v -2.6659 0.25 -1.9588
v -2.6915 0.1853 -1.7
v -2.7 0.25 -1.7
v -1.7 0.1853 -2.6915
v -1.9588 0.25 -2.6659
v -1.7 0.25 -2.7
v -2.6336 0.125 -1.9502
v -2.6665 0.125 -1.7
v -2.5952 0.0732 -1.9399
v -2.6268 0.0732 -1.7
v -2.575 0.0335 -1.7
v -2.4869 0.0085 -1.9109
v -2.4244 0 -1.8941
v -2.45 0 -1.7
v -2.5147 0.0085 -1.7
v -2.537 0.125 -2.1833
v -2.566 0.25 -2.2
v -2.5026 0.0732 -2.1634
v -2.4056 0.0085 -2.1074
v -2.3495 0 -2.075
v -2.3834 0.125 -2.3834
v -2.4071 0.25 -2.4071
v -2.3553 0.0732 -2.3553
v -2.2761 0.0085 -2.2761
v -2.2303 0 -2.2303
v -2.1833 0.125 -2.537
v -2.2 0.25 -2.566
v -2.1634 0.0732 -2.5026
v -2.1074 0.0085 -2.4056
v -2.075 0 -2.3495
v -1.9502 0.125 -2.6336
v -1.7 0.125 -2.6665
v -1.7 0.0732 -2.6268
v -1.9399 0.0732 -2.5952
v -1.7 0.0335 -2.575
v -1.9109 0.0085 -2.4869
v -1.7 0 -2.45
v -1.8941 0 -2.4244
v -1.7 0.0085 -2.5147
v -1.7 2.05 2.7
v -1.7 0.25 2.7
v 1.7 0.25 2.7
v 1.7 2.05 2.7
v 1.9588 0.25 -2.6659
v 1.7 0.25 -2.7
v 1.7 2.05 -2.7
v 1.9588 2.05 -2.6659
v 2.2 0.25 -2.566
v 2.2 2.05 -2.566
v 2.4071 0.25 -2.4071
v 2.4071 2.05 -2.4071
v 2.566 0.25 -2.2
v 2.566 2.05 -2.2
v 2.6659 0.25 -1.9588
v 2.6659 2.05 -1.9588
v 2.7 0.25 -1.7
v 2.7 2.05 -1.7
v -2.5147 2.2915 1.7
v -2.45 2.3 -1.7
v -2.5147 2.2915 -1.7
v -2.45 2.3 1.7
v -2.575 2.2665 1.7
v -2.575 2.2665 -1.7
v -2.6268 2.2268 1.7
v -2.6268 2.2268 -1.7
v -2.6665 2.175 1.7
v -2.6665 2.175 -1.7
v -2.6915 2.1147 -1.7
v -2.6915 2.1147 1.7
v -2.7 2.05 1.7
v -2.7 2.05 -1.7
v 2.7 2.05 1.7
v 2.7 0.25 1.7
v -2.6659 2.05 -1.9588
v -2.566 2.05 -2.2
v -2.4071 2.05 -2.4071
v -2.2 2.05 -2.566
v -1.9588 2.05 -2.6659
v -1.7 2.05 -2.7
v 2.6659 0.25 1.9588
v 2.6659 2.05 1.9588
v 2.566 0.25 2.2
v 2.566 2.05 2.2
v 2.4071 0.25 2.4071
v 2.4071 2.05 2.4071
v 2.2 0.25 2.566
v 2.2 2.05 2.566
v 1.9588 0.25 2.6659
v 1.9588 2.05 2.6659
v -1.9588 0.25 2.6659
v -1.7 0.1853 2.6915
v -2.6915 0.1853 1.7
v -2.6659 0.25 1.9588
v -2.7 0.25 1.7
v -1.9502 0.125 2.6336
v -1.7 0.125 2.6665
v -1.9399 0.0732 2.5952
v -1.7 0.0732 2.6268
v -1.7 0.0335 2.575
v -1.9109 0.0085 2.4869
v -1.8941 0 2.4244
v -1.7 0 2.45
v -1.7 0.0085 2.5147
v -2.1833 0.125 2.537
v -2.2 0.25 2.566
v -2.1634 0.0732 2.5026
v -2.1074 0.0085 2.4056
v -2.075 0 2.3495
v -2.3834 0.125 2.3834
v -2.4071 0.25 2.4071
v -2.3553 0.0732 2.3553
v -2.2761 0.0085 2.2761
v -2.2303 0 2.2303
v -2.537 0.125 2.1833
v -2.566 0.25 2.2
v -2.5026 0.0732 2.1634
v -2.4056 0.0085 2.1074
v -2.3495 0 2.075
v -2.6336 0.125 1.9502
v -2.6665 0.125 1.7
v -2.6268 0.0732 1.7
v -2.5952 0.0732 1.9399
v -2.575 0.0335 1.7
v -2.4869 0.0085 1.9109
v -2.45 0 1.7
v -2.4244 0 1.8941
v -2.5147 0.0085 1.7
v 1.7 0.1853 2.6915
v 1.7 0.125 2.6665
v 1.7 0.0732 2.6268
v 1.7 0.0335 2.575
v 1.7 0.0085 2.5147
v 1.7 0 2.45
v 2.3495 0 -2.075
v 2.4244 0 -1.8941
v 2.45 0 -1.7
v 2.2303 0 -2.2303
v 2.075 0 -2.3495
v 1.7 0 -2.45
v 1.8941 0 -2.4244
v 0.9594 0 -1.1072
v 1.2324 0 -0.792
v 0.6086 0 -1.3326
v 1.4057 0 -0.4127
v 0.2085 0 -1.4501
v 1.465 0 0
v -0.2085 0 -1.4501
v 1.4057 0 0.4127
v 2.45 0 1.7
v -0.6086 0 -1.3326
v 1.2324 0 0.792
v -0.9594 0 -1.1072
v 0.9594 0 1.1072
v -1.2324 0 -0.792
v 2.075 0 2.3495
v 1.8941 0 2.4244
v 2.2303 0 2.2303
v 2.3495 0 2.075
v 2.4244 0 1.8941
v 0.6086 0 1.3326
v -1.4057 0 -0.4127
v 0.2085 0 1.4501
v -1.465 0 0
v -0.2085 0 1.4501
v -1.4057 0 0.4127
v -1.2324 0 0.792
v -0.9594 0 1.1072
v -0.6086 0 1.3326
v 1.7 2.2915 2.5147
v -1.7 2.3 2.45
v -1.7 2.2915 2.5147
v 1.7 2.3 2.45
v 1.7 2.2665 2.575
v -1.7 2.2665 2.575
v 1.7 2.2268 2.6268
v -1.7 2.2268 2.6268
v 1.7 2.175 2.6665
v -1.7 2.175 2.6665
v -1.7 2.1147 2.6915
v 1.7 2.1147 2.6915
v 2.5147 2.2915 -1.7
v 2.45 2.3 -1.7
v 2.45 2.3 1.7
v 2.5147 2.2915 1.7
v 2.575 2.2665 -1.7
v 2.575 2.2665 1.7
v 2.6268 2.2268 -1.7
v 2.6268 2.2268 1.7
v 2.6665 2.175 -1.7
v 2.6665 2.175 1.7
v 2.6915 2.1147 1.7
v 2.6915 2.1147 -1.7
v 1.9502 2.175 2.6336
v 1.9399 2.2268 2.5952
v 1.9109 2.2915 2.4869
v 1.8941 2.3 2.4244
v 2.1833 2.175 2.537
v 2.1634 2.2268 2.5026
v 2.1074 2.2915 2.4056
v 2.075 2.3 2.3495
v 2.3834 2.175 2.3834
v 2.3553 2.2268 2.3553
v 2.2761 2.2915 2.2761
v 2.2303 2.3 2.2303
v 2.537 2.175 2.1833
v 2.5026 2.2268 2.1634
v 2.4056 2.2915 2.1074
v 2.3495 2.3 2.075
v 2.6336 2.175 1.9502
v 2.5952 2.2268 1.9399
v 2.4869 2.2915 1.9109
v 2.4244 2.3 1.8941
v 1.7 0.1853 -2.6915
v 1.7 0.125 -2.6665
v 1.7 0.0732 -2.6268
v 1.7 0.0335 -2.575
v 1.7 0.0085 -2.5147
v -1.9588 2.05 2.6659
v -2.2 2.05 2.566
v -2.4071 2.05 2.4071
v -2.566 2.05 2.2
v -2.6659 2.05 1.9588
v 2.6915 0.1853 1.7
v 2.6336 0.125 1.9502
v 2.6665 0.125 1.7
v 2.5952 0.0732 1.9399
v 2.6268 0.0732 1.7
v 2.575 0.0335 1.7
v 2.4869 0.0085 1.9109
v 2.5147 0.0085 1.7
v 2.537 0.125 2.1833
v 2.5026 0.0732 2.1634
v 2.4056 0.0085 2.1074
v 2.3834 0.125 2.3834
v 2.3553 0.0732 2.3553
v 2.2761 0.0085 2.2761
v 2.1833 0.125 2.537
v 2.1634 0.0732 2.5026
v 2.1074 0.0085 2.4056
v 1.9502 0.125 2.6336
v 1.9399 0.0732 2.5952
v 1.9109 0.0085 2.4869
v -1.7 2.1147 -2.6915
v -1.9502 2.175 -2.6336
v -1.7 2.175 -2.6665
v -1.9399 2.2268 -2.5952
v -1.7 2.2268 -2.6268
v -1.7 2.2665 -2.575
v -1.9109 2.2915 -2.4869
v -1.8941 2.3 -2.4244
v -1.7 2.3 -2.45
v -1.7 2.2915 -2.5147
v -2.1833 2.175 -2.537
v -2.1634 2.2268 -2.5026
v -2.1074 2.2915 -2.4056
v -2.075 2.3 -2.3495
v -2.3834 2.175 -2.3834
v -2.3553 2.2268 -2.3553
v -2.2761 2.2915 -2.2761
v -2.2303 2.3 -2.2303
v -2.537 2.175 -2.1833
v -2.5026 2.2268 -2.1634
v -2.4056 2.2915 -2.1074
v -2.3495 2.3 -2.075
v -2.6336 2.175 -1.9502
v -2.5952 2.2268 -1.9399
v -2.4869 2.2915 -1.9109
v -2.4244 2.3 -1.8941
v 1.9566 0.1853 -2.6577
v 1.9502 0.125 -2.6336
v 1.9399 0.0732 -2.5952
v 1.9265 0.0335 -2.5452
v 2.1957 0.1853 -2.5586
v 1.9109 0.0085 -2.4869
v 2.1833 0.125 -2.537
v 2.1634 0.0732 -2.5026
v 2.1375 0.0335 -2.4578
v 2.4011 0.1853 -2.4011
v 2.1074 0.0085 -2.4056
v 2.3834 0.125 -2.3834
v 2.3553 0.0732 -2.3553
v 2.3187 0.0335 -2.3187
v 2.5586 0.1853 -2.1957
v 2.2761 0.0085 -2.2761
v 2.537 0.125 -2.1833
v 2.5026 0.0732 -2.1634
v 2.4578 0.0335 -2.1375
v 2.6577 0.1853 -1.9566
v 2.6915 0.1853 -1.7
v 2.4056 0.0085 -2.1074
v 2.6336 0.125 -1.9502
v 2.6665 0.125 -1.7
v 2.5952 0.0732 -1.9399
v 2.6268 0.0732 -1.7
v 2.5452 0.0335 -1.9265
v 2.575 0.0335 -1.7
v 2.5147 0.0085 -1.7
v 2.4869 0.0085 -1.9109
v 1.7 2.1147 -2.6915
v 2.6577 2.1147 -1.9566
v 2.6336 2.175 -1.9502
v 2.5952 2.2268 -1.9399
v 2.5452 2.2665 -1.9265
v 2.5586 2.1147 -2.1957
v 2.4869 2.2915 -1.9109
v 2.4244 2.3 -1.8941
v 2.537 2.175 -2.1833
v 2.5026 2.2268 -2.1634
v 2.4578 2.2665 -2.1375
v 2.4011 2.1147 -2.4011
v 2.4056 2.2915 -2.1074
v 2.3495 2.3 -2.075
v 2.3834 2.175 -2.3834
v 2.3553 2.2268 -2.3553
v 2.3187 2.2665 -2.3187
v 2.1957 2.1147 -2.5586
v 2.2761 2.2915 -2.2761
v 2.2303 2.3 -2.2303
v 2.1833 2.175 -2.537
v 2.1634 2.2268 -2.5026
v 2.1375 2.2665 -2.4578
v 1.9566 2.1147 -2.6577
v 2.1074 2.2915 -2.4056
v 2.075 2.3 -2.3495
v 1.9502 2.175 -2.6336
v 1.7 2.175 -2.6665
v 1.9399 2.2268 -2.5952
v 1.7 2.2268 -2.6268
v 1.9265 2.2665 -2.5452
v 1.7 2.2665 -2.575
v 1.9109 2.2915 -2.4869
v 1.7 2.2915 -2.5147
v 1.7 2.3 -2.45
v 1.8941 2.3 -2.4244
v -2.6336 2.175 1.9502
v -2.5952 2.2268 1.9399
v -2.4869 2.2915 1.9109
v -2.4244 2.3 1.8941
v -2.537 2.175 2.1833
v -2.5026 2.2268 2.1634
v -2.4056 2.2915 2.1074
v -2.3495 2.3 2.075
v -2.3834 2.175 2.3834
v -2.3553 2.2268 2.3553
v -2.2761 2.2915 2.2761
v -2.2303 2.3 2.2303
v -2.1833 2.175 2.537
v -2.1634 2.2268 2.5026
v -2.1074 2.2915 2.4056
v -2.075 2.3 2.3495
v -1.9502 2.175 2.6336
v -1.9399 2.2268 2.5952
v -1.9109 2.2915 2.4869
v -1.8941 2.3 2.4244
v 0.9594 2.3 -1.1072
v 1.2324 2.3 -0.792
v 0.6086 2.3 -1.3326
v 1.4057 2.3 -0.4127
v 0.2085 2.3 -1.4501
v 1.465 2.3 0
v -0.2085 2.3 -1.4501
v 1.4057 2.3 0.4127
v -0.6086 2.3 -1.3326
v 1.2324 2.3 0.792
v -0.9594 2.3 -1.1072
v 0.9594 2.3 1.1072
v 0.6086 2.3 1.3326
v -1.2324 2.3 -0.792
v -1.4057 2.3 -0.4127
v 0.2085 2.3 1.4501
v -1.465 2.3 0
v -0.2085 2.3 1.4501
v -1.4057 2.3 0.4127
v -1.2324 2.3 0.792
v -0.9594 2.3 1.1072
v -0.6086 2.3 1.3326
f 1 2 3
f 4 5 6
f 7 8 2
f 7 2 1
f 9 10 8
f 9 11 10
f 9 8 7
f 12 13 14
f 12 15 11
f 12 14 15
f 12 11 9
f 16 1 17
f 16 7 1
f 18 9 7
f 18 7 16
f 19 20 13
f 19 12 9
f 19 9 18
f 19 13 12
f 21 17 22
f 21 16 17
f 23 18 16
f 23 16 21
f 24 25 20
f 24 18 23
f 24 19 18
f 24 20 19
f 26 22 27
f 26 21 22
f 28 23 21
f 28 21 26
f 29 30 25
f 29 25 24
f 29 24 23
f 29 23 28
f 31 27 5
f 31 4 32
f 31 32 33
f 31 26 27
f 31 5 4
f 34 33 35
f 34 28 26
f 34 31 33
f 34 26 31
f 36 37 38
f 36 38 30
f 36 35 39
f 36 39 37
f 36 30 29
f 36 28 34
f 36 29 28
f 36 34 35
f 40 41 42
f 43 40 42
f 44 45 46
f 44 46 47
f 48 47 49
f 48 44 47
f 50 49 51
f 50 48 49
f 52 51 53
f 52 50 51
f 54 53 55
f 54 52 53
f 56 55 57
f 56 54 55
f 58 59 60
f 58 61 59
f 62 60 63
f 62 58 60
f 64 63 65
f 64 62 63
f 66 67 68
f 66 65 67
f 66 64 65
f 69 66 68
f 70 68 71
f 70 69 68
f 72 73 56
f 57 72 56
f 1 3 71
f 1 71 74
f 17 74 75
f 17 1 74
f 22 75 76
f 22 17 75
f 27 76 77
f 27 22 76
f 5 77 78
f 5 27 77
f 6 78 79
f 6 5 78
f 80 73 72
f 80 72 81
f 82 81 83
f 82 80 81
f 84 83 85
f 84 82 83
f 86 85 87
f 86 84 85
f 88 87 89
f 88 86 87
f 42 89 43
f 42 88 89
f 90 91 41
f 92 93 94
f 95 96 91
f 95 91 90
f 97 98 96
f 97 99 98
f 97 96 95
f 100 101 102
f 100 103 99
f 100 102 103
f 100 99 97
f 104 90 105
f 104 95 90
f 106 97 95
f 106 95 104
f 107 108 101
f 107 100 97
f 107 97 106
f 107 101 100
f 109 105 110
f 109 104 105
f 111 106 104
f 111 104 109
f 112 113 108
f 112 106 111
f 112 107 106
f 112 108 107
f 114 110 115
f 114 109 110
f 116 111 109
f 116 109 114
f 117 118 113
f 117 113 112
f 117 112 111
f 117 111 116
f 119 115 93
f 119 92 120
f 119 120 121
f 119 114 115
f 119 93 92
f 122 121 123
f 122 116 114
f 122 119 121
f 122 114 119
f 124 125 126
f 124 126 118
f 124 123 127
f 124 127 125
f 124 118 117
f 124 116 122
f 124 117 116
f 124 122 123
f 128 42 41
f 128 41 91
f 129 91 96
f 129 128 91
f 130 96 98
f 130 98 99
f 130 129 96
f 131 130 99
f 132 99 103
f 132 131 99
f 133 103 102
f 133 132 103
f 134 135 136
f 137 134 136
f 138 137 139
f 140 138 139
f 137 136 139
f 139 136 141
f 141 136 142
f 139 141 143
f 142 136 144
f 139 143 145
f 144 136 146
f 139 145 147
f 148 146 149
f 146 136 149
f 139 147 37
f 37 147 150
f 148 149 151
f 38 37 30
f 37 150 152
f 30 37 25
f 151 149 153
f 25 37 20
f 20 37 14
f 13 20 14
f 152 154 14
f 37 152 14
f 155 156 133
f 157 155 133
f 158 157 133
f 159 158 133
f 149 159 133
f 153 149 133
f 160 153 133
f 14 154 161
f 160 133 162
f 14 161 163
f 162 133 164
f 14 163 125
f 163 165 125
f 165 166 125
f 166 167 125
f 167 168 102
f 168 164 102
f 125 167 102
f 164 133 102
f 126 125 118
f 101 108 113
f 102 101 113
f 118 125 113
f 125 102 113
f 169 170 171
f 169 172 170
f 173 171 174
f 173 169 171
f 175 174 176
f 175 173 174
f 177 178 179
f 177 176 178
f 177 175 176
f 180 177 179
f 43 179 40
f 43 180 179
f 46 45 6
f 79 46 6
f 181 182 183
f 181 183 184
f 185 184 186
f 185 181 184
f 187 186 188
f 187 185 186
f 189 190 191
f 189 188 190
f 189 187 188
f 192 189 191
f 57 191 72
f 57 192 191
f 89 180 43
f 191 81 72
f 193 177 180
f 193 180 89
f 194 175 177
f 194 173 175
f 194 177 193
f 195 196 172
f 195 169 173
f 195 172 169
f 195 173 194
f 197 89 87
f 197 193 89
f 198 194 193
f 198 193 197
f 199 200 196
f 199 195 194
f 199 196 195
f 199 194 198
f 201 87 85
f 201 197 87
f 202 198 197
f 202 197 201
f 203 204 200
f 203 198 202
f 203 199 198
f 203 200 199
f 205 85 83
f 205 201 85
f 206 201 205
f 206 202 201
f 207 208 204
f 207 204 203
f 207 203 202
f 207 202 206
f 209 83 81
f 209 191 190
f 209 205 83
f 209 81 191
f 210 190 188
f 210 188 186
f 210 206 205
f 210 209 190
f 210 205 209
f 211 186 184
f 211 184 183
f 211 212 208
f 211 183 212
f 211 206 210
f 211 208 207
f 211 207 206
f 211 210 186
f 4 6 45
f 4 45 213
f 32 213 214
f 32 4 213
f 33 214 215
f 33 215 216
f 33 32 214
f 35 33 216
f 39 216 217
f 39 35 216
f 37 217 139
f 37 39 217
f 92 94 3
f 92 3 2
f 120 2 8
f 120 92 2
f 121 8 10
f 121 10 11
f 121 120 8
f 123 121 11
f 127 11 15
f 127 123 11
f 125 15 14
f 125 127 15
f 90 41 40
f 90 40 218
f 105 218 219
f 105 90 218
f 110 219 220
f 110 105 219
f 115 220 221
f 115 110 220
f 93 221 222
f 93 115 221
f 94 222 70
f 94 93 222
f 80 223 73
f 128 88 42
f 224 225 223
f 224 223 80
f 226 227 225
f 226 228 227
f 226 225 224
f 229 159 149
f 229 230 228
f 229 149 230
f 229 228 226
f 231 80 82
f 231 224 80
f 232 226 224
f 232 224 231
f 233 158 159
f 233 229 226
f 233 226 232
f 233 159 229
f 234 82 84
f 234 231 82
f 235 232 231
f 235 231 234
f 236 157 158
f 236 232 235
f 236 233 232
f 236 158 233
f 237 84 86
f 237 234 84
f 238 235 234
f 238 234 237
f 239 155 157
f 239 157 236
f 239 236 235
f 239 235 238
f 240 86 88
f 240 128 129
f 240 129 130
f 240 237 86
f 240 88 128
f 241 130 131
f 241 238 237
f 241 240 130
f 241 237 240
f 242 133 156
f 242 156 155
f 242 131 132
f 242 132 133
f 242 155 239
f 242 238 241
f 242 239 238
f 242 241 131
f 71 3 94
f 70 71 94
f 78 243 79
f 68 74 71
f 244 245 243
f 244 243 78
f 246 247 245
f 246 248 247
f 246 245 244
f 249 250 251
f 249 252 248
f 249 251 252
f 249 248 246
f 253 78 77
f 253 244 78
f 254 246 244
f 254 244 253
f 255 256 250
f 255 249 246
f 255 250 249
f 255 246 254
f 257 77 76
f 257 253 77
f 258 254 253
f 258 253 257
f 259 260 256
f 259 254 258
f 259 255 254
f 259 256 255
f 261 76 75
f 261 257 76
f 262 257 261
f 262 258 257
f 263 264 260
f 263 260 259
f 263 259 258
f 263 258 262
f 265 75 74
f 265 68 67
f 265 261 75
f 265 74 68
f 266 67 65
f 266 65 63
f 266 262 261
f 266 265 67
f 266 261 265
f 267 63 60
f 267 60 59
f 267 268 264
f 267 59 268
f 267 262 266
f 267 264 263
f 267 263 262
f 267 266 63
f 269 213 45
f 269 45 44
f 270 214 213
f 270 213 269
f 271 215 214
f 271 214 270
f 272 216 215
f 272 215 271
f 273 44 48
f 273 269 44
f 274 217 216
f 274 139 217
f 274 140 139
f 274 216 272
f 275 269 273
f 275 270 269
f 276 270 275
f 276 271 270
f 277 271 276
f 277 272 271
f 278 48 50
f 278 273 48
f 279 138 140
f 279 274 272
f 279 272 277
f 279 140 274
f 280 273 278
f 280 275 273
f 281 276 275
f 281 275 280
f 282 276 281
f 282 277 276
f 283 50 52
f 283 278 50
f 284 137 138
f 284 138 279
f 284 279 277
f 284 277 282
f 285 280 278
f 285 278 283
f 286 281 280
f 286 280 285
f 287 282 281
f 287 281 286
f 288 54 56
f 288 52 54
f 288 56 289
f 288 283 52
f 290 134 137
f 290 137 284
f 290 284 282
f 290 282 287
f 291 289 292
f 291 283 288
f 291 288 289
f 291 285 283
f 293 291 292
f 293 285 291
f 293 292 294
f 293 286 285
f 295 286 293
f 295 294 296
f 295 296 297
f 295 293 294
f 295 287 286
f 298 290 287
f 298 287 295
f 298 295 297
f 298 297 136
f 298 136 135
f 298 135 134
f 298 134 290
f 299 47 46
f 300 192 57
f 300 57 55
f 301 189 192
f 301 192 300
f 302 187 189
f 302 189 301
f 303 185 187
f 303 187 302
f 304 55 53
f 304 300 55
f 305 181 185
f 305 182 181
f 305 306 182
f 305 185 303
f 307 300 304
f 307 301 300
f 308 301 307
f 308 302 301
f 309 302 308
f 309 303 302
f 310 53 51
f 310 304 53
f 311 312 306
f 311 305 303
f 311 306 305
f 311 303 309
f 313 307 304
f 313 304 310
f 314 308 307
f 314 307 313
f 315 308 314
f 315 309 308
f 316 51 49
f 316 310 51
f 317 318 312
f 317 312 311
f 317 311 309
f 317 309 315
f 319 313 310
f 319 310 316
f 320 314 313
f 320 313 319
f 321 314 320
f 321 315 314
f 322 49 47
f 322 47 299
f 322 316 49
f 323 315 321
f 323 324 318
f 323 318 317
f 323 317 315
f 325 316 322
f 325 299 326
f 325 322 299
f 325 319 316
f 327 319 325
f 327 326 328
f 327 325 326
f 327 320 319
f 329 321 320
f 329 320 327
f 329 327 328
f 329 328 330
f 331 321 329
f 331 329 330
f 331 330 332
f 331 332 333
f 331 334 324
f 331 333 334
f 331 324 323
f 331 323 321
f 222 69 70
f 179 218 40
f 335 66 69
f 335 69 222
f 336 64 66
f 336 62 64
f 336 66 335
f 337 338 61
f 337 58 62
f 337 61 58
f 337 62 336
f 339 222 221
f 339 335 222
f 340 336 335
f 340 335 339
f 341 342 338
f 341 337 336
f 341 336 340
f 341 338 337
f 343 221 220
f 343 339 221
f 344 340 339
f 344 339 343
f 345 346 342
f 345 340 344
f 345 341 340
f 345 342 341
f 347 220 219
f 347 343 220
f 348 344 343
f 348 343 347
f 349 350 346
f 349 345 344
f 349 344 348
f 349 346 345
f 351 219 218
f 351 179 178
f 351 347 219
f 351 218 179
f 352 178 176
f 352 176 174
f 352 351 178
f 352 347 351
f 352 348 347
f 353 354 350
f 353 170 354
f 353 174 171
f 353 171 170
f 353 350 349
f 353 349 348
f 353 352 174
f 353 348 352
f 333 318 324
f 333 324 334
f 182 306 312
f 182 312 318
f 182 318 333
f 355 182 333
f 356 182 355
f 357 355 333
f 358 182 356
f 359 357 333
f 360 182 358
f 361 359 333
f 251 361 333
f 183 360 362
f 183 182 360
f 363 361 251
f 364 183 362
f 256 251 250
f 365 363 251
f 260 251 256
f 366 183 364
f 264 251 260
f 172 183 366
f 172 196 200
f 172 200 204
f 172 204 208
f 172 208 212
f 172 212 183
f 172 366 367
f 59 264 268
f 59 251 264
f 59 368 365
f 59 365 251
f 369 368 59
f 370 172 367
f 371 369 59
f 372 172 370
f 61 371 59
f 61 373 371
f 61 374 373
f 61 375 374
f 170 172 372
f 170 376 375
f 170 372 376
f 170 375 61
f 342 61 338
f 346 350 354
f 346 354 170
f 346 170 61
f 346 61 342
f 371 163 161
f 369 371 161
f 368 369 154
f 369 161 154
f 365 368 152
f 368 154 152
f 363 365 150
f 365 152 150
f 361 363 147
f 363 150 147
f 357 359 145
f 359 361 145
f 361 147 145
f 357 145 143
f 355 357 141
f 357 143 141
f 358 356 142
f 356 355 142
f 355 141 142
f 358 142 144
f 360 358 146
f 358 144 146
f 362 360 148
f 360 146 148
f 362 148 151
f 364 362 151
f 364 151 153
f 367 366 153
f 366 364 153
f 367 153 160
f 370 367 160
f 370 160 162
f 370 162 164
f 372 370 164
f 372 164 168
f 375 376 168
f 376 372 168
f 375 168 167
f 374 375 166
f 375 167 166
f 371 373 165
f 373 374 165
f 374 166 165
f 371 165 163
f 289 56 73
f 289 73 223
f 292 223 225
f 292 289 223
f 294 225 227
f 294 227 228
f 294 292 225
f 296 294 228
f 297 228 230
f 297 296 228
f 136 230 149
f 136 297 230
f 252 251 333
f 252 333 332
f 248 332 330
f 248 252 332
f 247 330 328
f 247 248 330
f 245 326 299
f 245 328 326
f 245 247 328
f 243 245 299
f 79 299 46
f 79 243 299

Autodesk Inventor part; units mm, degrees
ref_plane "YZ Plane" through (0, 0, 0) normal (1, 0, 0) x (0, 1, 0)
ref_plane "XZ Plane" through (0, 0, 0) normal (0, 1, 0) x (-1, 0, 0)
ref_plane "XY Plane" through (0, 0, 0) normal (0, 0, 1) x (1, 0, 0)
sketch "Sketch1" plane through (0, 0, 0) normal (0, 1, 0) x (-1, 0, 0)
  circle A0 centre (0, 0) radius 1.465
  line L0 (-1.7, -2.7) -> (1.7, -2.7)
  line L1 (2.7, -1.7) -> (2.7, 1.7)
  line L2 (1.7, 2.7) -> (-1.7, 2.7)
  line L3 (-2.7, 1.7) -> (-2.7, -1.7)
  line L4 (-2.7, -2.7) -> (2.7, 2.7) construction
  line L5 (2.7, -2.7) -> (-2.7, 2.7) construction
  arc A1 (2.7, 1.7) -> (1.7, 2.7) centre (1.7, 1.7) ccw
  arc A2 (-1.7, 2.7) -> (-2.7, 1.7) centre (-1.7, 1.7) ccw
  arc A3 (-2.7, -1.7) -> (-1.7, -2.7) centre (-1.7, -1.7) ccw
  arc A4 (1.7, -2.7) -> (2.7, -1.7) centre (1.7, -1.7) ccw
  dimension "d0" = 2.93
  dimension "d1" = 5.4
  dimension "d2" = 5.4
  dimension "d3" = 1
extrude "Extrusion1" add sketch "Sketch1" along normal blind 2.3
fillet "Fillet1" radius 0.25 16 edges at (2.7, 2.3, 0) (2.4071, 2.3, -2.4071) (0, 2.3, -2.7) (-2.4071, 2.3, -2.4071) (-2.7, 2.3, 0) (-2.4071, 2.3, 2.4071) (0, 2.3, 2.7) (2.4071, 2.3, 2.4071) (2.7, 0, 0) (2.4071, 0, -2.4071) (0, 0, -2.7) (-2.4071, 0, -2.4071) (-2.7, 0, 0) (-2.4071, 0, 2.4071) (0, 0, 2.7) (2.4071, 0, 2.4071)
thread "Thread1"
properties part number "M3 Square Nut"
